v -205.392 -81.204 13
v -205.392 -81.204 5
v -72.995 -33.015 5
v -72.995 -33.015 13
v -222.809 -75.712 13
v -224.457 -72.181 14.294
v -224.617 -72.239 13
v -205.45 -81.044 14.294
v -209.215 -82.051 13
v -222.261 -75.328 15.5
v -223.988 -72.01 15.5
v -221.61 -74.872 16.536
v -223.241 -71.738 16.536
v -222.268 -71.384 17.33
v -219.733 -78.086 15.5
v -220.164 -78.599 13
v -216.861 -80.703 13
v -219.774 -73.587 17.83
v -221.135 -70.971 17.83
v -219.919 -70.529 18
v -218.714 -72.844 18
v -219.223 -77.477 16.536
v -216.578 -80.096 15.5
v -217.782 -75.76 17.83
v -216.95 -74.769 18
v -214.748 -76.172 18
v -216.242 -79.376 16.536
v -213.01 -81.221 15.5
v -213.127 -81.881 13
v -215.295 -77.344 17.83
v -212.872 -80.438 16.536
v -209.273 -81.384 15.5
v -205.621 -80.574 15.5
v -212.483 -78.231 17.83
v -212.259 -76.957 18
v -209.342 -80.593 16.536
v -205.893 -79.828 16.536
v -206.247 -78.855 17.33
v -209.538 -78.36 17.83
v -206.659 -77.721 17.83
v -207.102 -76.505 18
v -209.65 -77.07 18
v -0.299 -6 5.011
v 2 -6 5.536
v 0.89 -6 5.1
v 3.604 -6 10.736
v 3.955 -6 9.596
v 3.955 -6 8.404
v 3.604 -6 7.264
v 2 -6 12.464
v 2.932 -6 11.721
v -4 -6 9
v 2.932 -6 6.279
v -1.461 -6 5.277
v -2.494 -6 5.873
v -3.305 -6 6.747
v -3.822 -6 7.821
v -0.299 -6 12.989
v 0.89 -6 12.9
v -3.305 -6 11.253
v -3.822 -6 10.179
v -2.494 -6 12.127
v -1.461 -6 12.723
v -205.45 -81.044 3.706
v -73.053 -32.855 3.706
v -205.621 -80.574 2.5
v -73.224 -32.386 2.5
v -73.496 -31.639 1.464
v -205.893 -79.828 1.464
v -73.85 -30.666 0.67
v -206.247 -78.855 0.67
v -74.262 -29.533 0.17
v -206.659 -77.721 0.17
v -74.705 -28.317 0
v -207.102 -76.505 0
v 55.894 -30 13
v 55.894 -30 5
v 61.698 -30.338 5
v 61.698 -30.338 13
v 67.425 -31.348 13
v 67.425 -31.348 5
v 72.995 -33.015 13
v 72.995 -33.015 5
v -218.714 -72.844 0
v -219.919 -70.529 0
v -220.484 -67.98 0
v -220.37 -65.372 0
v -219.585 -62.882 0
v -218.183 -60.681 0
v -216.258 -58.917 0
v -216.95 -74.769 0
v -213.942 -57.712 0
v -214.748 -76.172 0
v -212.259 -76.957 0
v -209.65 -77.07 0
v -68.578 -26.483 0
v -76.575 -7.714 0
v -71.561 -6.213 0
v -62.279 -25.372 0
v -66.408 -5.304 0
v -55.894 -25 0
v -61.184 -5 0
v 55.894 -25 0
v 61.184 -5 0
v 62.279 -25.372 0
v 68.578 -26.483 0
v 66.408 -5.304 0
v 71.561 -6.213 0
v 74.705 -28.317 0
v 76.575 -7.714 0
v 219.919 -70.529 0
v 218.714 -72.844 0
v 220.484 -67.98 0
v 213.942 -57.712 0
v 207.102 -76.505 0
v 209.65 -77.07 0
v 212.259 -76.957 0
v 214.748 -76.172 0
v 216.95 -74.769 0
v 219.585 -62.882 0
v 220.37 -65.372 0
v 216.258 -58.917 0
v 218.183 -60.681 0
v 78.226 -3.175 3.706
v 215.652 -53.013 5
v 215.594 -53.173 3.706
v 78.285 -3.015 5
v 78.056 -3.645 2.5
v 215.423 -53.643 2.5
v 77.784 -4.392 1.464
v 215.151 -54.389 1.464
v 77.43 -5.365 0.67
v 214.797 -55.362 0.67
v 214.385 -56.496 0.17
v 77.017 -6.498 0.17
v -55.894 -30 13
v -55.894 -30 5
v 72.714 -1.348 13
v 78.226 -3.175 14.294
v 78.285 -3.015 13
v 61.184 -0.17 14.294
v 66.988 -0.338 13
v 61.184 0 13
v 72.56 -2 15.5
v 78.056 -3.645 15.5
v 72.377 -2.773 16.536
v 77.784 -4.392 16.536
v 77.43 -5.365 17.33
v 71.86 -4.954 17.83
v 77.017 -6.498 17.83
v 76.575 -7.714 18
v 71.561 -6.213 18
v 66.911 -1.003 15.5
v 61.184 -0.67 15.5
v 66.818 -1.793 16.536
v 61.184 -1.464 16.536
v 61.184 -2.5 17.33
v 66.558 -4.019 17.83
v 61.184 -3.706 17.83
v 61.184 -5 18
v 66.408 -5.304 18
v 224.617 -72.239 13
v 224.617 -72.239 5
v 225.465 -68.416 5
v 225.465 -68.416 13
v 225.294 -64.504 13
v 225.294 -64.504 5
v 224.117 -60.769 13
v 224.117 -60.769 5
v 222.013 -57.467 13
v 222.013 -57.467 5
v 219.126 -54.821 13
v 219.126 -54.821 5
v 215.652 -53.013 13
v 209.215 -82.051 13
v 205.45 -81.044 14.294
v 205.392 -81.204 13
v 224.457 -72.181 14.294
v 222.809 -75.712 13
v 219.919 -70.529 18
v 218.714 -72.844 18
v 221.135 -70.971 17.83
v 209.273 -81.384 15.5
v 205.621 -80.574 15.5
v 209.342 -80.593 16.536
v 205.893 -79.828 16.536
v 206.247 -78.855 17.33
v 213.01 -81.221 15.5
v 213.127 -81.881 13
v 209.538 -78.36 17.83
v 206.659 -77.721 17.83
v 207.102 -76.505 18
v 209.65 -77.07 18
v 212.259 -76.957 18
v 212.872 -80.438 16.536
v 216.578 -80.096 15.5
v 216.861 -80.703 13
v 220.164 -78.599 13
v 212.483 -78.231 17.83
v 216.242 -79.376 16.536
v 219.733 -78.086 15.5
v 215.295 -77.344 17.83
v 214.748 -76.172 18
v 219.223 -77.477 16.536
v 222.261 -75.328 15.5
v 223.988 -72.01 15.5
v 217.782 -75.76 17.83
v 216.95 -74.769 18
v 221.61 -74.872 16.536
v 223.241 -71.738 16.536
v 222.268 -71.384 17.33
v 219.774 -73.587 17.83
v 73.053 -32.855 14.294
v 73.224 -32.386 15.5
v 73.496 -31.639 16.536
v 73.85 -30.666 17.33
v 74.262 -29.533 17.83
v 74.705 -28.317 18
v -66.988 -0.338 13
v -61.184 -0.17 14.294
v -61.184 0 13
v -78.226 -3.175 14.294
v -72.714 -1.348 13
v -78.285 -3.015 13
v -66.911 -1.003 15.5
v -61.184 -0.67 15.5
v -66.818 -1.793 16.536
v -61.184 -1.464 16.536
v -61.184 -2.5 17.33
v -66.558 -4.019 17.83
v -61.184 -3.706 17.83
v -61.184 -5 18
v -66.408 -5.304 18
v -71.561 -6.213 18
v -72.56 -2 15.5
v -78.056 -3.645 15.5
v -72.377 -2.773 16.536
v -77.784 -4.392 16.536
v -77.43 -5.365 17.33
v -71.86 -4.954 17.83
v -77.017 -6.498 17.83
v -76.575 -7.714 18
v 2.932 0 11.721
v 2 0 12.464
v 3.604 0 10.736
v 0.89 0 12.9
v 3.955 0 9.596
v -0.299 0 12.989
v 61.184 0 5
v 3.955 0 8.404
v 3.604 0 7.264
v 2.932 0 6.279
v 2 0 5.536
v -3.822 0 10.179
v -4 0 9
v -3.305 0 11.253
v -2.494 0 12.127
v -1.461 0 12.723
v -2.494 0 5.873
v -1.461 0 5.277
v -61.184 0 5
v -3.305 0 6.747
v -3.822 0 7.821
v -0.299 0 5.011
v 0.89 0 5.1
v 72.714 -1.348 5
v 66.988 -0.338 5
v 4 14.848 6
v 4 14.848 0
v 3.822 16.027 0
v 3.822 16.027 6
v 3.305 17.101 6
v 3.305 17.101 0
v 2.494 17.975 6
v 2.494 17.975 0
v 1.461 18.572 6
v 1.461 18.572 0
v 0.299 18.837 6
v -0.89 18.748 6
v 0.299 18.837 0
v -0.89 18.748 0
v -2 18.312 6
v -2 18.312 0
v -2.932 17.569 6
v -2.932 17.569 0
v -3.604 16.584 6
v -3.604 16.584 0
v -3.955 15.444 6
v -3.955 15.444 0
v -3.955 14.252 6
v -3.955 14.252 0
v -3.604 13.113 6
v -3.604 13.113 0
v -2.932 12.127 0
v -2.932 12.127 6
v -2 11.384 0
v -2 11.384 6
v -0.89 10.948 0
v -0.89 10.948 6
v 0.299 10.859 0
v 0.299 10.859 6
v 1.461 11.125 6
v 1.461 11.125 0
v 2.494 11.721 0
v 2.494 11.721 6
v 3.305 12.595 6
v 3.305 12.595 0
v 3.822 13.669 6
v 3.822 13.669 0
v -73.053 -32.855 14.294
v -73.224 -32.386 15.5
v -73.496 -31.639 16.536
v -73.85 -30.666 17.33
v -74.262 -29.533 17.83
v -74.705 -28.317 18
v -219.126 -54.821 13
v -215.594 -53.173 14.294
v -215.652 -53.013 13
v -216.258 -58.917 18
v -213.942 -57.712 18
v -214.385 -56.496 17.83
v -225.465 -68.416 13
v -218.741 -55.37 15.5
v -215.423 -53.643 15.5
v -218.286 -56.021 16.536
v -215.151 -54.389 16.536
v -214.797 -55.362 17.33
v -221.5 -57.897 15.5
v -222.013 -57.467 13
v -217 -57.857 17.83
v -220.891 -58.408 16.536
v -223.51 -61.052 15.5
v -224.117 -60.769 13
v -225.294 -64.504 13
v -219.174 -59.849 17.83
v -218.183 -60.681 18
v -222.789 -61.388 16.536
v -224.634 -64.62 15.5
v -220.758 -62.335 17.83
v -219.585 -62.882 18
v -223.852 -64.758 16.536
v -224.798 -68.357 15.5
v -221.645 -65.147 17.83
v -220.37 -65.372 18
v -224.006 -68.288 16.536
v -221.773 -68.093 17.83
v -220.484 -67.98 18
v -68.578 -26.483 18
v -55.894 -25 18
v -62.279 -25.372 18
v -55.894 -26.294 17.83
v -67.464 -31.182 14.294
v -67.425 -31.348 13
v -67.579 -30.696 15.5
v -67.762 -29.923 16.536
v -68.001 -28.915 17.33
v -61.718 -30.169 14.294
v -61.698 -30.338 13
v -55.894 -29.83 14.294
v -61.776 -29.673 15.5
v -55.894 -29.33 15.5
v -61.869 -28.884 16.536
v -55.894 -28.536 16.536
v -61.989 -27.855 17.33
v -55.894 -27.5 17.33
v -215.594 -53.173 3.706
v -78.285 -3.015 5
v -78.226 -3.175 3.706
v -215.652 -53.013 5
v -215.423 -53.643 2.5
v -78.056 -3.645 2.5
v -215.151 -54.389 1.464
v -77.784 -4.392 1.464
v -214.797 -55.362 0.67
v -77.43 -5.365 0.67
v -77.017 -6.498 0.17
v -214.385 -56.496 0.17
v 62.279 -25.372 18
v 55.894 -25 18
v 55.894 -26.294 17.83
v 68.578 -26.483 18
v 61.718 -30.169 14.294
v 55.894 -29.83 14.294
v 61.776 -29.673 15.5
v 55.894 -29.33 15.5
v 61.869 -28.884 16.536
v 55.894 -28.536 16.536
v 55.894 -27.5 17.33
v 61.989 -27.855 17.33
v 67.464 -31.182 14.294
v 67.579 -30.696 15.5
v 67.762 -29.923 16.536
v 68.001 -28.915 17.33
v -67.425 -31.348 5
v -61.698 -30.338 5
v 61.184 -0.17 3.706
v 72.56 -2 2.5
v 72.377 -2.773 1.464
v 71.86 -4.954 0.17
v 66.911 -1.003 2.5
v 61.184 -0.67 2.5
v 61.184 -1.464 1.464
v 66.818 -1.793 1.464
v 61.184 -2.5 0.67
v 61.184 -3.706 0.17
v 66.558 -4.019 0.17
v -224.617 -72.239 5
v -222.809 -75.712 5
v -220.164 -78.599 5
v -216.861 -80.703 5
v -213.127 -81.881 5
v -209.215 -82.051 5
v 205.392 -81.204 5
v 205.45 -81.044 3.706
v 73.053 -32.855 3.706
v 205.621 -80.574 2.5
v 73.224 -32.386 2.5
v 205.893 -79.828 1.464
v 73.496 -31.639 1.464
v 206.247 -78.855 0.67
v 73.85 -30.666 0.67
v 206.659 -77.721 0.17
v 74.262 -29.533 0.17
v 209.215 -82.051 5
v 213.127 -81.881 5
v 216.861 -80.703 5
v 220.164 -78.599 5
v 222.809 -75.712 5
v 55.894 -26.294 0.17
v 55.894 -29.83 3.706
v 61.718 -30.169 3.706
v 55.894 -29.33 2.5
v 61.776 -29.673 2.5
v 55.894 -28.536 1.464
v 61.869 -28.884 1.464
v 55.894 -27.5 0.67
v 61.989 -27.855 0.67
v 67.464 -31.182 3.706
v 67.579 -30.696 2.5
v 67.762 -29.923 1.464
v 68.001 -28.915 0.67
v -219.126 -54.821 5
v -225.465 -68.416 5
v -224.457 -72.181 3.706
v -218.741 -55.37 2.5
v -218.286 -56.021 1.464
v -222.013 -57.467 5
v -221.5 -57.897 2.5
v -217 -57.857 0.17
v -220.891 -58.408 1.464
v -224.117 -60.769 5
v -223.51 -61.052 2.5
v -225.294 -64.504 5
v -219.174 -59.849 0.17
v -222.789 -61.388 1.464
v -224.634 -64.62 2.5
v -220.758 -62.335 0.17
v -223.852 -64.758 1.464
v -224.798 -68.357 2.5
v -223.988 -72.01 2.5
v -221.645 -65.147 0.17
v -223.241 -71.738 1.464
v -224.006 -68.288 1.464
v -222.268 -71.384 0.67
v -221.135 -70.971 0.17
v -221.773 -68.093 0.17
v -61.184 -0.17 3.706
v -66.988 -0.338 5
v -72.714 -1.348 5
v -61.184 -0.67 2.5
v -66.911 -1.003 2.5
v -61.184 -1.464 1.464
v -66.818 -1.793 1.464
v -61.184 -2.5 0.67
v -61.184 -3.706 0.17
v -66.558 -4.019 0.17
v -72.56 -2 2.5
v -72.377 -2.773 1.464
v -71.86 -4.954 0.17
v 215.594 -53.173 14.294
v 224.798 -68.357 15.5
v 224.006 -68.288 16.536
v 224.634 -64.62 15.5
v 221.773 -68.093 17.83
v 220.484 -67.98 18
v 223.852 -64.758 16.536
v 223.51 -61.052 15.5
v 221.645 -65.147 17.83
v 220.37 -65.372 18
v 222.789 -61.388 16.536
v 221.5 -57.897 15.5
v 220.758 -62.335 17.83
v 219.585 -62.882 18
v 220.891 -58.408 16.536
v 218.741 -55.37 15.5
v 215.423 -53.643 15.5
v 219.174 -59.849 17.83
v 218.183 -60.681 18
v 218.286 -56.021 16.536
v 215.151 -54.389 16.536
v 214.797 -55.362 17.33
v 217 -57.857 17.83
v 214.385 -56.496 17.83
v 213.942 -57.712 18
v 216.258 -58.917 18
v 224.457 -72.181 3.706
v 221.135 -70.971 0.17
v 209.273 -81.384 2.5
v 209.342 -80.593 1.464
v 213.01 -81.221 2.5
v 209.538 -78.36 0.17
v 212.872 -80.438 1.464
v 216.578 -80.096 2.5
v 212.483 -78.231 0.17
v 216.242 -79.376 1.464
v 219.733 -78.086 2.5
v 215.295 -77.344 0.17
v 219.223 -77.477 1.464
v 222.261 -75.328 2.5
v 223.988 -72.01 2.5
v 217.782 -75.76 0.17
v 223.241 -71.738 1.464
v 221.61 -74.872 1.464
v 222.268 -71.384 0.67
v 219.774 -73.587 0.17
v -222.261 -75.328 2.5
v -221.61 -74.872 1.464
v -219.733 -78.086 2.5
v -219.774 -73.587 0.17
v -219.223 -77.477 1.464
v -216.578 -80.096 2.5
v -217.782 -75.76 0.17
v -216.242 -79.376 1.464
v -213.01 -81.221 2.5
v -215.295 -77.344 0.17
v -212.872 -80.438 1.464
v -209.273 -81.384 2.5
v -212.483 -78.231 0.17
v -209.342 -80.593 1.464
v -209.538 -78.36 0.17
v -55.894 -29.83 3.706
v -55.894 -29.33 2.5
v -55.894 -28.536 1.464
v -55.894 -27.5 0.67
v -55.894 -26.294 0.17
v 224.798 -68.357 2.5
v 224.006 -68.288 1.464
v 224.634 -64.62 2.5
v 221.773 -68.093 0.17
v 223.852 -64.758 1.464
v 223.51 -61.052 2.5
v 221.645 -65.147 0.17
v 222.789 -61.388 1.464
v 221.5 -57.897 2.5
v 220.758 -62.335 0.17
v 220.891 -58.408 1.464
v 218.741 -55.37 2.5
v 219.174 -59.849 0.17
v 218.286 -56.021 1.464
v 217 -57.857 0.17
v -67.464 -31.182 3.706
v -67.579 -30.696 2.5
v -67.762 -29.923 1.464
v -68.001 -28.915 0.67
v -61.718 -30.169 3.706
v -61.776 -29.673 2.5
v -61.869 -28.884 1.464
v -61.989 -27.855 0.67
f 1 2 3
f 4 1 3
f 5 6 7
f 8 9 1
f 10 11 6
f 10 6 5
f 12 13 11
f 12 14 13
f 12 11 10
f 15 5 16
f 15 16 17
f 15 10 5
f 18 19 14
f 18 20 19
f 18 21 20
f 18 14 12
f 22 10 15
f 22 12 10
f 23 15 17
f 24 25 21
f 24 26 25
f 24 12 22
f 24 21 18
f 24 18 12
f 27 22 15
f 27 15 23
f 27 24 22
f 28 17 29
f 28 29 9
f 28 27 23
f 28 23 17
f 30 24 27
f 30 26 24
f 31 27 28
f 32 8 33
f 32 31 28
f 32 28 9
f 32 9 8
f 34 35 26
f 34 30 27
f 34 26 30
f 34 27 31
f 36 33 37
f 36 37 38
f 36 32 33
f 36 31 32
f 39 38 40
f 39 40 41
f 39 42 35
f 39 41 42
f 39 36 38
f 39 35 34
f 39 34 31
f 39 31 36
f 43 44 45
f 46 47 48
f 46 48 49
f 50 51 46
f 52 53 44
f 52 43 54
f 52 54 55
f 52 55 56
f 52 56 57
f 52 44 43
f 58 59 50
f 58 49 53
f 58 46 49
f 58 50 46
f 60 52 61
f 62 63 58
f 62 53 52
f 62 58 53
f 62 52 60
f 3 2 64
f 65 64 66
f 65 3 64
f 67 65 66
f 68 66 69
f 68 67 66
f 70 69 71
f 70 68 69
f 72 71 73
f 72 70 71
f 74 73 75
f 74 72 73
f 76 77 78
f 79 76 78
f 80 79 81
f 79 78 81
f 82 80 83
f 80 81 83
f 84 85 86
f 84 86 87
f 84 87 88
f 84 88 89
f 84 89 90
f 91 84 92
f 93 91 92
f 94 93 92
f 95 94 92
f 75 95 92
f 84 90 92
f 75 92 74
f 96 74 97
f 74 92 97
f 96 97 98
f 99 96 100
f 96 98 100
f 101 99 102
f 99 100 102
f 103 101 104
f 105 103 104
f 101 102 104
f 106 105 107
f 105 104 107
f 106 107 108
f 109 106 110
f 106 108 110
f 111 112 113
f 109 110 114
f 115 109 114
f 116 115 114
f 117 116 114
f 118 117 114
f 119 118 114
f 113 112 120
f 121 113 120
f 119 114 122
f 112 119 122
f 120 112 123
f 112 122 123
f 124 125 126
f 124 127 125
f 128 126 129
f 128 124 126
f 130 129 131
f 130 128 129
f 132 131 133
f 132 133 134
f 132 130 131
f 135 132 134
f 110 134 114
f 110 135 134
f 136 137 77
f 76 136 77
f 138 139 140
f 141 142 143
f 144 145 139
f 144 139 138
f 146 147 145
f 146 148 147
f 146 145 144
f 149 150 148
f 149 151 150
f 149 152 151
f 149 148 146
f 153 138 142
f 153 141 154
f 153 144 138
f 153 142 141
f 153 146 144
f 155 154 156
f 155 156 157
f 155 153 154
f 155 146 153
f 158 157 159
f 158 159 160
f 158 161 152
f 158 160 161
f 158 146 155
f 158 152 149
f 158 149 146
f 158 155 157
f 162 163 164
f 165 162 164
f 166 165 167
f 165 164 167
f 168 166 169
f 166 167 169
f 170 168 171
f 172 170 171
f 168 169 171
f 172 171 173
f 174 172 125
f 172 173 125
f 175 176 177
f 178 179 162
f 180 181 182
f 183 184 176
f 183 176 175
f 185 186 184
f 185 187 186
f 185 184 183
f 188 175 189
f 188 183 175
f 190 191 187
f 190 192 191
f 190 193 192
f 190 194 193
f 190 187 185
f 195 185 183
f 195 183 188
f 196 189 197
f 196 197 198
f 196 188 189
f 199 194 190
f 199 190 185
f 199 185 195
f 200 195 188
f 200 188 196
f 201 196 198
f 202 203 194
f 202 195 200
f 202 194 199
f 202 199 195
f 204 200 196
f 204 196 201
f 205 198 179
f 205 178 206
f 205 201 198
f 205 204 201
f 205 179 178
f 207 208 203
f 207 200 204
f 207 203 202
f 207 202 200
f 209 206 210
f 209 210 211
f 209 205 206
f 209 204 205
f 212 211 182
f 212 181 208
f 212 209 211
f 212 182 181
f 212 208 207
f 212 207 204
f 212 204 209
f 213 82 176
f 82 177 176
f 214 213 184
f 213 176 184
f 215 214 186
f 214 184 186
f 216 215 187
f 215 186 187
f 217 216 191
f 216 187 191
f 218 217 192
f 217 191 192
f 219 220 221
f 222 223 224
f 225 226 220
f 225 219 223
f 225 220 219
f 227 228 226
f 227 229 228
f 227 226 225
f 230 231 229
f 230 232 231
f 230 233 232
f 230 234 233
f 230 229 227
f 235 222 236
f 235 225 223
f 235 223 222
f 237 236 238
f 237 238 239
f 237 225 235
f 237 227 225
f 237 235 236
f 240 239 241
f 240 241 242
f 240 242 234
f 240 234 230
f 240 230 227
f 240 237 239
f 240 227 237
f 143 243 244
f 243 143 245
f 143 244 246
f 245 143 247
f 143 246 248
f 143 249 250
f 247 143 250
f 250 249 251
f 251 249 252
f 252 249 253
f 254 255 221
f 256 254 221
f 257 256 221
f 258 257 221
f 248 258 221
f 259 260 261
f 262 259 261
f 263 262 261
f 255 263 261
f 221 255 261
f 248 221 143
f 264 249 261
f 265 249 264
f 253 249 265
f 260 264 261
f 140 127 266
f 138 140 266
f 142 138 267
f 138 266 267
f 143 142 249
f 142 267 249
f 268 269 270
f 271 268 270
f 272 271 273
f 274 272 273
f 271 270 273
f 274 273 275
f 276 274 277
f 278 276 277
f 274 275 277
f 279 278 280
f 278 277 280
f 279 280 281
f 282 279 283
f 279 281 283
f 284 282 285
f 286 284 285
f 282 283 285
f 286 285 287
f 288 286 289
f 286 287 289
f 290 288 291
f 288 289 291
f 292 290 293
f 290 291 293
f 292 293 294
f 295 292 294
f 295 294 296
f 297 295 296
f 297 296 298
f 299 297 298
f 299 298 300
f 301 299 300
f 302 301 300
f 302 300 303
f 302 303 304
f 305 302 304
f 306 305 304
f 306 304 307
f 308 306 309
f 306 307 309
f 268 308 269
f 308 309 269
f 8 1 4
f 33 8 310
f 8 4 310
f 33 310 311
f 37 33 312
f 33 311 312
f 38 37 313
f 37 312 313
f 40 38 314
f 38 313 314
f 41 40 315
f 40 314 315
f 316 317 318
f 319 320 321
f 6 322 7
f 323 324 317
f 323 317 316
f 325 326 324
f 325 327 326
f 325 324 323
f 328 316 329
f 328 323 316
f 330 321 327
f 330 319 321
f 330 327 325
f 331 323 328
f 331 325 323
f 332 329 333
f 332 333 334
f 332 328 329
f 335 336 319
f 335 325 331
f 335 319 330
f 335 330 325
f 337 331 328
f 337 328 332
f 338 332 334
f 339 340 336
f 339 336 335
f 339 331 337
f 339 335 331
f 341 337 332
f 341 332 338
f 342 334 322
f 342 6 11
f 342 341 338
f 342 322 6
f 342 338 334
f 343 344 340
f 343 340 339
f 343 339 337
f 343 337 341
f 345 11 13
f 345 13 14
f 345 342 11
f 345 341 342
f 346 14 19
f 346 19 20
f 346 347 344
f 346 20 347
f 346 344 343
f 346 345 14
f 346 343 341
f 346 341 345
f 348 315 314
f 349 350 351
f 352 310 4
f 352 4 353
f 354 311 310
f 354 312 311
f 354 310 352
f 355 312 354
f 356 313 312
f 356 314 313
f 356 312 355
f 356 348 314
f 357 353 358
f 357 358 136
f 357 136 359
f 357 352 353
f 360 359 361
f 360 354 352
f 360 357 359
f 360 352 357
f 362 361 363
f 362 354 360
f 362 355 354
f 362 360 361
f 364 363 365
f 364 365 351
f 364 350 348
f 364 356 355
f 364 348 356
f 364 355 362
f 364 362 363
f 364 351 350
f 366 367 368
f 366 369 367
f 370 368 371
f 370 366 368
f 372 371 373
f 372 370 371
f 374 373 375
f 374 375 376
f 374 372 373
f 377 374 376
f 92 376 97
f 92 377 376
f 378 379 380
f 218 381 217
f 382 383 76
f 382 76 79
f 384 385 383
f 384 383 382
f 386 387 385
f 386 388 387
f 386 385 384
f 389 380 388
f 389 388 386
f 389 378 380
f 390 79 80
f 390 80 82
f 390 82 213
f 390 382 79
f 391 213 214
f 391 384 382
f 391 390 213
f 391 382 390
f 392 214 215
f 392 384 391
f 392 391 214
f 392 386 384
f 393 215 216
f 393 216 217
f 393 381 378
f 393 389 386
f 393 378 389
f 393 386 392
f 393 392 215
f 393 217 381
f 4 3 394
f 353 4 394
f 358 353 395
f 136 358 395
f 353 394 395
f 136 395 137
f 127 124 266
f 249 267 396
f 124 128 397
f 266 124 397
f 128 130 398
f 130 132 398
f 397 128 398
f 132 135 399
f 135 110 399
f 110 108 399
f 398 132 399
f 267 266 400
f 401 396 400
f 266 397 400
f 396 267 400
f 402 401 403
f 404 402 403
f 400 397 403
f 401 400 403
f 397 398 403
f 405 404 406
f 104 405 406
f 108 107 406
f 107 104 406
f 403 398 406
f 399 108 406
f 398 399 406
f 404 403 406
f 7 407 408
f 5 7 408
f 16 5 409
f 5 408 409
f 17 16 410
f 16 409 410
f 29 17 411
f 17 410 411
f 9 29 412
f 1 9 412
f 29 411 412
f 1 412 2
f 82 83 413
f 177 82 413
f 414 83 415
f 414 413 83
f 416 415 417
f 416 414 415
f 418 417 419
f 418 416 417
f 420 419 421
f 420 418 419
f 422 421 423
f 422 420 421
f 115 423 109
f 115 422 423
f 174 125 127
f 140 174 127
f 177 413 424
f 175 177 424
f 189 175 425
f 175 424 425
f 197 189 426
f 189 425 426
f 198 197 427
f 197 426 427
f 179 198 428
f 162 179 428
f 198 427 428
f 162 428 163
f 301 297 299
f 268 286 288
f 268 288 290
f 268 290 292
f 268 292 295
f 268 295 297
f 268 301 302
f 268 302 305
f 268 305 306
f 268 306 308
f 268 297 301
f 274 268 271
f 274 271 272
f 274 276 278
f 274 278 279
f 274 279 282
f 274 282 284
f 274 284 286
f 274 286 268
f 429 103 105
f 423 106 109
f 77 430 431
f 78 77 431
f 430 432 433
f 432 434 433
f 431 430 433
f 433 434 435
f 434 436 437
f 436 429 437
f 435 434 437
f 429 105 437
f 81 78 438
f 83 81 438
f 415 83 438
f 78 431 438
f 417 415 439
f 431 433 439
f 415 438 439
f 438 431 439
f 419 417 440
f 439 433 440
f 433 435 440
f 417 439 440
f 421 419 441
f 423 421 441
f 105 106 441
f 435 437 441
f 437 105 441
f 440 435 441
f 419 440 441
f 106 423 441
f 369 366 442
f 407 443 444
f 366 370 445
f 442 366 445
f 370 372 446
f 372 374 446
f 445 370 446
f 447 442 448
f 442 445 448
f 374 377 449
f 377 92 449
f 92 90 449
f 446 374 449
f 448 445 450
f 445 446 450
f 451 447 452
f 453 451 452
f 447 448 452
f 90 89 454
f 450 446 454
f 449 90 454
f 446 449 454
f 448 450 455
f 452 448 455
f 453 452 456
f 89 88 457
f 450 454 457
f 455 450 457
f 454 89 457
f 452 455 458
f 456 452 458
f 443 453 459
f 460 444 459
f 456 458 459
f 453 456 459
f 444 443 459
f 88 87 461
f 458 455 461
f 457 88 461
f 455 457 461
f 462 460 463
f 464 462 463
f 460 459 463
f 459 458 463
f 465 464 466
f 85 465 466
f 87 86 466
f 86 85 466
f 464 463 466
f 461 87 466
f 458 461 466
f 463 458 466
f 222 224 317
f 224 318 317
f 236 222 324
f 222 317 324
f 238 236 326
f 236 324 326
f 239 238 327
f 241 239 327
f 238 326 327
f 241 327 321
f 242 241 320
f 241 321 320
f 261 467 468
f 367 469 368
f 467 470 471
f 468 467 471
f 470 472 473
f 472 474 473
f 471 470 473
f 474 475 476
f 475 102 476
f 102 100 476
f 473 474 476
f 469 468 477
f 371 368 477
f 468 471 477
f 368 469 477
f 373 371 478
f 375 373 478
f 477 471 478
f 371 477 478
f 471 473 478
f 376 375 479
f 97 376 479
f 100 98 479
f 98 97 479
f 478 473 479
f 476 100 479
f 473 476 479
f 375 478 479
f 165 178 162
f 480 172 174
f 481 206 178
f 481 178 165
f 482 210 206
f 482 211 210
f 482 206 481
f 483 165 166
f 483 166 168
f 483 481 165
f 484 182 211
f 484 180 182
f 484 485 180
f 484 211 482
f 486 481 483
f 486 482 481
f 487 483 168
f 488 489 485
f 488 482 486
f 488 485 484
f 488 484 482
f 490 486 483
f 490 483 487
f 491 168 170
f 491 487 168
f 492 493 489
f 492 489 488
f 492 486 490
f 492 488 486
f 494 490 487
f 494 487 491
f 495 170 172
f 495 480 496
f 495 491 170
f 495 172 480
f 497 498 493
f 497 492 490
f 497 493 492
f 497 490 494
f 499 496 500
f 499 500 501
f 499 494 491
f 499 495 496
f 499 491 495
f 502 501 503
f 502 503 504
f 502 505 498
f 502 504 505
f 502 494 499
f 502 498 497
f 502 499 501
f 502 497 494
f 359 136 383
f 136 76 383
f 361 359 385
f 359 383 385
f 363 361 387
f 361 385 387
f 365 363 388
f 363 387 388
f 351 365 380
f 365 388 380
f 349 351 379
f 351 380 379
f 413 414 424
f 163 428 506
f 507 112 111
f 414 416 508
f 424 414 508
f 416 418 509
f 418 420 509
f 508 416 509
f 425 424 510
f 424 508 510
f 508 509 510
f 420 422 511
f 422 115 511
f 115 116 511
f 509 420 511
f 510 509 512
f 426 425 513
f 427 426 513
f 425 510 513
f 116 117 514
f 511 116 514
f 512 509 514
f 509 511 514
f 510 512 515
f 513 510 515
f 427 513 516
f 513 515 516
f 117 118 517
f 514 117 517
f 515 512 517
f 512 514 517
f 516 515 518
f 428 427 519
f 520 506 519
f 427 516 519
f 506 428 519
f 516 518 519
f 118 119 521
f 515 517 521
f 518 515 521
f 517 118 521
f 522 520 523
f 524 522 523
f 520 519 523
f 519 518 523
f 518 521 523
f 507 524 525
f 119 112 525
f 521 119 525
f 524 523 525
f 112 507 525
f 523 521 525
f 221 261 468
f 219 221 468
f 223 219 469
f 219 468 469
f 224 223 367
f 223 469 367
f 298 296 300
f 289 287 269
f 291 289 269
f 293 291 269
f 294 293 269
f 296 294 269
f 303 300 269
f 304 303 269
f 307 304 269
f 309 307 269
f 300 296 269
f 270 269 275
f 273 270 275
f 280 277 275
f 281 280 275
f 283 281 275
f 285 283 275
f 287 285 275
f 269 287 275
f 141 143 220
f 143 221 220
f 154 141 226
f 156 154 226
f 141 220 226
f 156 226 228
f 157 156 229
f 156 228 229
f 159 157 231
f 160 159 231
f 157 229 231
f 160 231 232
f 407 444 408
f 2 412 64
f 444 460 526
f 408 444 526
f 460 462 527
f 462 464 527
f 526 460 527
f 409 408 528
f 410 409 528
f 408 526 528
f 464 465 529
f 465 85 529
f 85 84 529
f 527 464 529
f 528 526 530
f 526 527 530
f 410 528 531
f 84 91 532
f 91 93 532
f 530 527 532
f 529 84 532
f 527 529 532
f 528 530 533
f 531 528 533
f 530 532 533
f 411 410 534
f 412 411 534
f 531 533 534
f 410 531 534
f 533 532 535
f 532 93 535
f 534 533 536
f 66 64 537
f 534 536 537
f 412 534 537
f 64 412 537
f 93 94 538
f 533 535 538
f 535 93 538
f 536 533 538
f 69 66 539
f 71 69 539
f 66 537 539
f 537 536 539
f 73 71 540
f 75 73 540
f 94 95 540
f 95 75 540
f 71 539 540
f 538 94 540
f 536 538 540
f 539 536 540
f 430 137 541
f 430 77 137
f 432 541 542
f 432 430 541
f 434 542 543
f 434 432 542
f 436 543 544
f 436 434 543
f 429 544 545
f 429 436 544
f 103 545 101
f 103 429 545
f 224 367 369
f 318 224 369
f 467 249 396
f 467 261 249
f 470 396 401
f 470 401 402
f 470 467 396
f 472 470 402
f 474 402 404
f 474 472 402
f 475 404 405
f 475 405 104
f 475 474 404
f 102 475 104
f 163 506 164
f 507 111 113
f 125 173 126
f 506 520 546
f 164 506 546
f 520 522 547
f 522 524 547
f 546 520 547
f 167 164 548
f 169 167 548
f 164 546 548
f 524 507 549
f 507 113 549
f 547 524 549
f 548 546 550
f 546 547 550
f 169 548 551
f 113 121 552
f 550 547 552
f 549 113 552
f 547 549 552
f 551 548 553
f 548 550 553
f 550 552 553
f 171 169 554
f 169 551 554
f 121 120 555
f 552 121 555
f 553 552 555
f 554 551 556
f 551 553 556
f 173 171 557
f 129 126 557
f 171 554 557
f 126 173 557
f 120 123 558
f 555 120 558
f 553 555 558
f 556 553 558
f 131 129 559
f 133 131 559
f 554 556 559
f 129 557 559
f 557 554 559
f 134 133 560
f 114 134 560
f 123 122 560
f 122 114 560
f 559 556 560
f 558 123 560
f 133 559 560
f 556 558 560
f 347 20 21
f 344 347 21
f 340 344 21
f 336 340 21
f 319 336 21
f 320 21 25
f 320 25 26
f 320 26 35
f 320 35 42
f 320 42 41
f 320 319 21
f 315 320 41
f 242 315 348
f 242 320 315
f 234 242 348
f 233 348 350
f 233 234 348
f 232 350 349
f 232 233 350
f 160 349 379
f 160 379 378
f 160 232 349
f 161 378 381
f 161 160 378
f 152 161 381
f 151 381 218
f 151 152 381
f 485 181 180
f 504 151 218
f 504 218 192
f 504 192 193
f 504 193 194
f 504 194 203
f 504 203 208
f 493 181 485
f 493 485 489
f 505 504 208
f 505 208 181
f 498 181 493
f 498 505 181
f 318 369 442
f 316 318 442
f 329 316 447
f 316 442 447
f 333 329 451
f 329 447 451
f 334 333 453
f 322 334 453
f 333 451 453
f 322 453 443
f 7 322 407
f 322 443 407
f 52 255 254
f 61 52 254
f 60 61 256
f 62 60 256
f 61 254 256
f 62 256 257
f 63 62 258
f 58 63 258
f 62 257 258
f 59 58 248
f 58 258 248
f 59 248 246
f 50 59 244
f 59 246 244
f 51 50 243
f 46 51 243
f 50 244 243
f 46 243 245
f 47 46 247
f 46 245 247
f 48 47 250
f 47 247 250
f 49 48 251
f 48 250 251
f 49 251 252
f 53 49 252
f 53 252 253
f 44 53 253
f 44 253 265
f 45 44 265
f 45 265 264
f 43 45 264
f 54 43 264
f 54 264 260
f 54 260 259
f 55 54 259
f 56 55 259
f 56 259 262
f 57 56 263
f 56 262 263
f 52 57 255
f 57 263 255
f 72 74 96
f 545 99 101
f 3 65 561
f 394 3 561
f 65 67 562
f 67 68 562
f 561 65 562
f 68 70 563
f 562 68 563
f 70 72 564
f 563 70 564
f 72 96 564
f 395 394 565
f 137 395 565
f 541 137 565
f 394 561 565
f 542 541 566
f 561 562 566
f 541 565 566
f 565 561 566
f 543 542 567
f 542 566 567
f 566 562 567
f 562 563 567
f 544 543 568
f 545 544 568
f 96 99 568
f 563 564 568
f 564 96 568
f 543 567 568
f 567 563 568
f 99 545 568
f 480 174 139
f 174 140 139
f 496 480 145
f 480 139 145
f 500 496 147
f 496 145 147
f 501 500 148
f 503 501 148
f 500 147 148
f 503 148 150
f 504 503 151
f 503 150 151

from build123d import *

# Parameters (mm, degrees)
F1_DEPTH = 18
F2_R     = 4
F3_DEPTH = 6
F4_R     = 4
F5_DEPTH = 6
F6_R     = 4.99999


# Not quite as in the source:
# - a fillet or chamfer is up to 0.001 mm smaller than in the source, because OpenCascade refuses the exact size


with BuildPart() as f1:
    # F0 (on Top) → F1 (new body)
    with BuildSketch(Plane.XY):
        with BuildLine():
            Line((61.1836509646, 0), (0, 0))
            Line((0, 0), (-61.1836509646, 0))
            ThreePointArc((-61.1836509646, 0), (-69.8660598479, -0.7596123494), (-78.2846581309, -3.0153689607))
            Line((-78.2846581309, -3.0153689607), (-215.6523562218, -53.0131222155))
            ThreePointArc((-215.6523562218, -53.0131222155), (-224.1166708775, -60.7692376012), (-224.6174433837, -72.2388136772))
            ThreePointArc((-224.6174433837, -72.2388136772), (-216.861327998, -80.7031283328), (-205.391751922, -81.2039008391))
            Line((-205.391751922, -81.2039008391), (-72.9948487096, -33.0153689607))
            ThreePointArc((-72.9948487096, -33.0153689607), (-64.5762504267, -30.7596123494), (-55.8938415433, -30))
            Line((-55.8938415433, -30), (0, -30))
            Line((0, -30), (55.8938415433, -30))
            ThreePointArc((55.8938415433, -30), (64.5762504267, -30.7596123494), (72.9948487096, -33.0153689607))
            Line((72.9948487096, -33.0153689607), (205.391751922, -81.2039008391))
            ThreePointArc((205.391751922, -81.2039008391), (216.861327998, -80.7031283328), (224.6174433837, -72.2388136772))
            ThreePointArc((224.6174433837, -72.2388136772), (224.1166708775, -60.7692376012), (215.6523562218, -53.0131222155))
            Line((215.6523562218, -53.0131222155), (78.2846581309, -3.0153689607))
            ThreePointArc((78.2846581309, -3.0153689607), (69.8660598479, -0.7596123494), (61.1836509646, 0))
        make_face()
    extrude(amount=F1_DEPTH)

    # F2 (on face) → F3 (cut)
    with BuildSketch(Plane(origin=(0, 0, 0), x_dir=(-1, 0, 0), z_dir=(0, 1, 0))):
        with Locations((0, 9)):
            Circle(F2_R)
    extrude(amount=-F3_DEPTH, mode=Mode.SUBTRACT)

    # F6 (radius 5 in the source; OpenCascade refuses exactly that, so slightly less here)
    f6_edges = [f1.edges().sort_by_distance(p)[0] for p in [
        (0, 0, 0),
        (0, 0, 18),
    ]]
    fillet(f6_edges, radius=F6_R)


with BuildPart() as f5:
    # F4 (on Top) → F5 (new body)
    with BuildSketch(Plane.XY):
        with Locations((0, 14.8481540382)):
            Circle(F4_R)
    extrude(amount=F5_DEPTH)


solid = Compound([f1.part, f5.part])
